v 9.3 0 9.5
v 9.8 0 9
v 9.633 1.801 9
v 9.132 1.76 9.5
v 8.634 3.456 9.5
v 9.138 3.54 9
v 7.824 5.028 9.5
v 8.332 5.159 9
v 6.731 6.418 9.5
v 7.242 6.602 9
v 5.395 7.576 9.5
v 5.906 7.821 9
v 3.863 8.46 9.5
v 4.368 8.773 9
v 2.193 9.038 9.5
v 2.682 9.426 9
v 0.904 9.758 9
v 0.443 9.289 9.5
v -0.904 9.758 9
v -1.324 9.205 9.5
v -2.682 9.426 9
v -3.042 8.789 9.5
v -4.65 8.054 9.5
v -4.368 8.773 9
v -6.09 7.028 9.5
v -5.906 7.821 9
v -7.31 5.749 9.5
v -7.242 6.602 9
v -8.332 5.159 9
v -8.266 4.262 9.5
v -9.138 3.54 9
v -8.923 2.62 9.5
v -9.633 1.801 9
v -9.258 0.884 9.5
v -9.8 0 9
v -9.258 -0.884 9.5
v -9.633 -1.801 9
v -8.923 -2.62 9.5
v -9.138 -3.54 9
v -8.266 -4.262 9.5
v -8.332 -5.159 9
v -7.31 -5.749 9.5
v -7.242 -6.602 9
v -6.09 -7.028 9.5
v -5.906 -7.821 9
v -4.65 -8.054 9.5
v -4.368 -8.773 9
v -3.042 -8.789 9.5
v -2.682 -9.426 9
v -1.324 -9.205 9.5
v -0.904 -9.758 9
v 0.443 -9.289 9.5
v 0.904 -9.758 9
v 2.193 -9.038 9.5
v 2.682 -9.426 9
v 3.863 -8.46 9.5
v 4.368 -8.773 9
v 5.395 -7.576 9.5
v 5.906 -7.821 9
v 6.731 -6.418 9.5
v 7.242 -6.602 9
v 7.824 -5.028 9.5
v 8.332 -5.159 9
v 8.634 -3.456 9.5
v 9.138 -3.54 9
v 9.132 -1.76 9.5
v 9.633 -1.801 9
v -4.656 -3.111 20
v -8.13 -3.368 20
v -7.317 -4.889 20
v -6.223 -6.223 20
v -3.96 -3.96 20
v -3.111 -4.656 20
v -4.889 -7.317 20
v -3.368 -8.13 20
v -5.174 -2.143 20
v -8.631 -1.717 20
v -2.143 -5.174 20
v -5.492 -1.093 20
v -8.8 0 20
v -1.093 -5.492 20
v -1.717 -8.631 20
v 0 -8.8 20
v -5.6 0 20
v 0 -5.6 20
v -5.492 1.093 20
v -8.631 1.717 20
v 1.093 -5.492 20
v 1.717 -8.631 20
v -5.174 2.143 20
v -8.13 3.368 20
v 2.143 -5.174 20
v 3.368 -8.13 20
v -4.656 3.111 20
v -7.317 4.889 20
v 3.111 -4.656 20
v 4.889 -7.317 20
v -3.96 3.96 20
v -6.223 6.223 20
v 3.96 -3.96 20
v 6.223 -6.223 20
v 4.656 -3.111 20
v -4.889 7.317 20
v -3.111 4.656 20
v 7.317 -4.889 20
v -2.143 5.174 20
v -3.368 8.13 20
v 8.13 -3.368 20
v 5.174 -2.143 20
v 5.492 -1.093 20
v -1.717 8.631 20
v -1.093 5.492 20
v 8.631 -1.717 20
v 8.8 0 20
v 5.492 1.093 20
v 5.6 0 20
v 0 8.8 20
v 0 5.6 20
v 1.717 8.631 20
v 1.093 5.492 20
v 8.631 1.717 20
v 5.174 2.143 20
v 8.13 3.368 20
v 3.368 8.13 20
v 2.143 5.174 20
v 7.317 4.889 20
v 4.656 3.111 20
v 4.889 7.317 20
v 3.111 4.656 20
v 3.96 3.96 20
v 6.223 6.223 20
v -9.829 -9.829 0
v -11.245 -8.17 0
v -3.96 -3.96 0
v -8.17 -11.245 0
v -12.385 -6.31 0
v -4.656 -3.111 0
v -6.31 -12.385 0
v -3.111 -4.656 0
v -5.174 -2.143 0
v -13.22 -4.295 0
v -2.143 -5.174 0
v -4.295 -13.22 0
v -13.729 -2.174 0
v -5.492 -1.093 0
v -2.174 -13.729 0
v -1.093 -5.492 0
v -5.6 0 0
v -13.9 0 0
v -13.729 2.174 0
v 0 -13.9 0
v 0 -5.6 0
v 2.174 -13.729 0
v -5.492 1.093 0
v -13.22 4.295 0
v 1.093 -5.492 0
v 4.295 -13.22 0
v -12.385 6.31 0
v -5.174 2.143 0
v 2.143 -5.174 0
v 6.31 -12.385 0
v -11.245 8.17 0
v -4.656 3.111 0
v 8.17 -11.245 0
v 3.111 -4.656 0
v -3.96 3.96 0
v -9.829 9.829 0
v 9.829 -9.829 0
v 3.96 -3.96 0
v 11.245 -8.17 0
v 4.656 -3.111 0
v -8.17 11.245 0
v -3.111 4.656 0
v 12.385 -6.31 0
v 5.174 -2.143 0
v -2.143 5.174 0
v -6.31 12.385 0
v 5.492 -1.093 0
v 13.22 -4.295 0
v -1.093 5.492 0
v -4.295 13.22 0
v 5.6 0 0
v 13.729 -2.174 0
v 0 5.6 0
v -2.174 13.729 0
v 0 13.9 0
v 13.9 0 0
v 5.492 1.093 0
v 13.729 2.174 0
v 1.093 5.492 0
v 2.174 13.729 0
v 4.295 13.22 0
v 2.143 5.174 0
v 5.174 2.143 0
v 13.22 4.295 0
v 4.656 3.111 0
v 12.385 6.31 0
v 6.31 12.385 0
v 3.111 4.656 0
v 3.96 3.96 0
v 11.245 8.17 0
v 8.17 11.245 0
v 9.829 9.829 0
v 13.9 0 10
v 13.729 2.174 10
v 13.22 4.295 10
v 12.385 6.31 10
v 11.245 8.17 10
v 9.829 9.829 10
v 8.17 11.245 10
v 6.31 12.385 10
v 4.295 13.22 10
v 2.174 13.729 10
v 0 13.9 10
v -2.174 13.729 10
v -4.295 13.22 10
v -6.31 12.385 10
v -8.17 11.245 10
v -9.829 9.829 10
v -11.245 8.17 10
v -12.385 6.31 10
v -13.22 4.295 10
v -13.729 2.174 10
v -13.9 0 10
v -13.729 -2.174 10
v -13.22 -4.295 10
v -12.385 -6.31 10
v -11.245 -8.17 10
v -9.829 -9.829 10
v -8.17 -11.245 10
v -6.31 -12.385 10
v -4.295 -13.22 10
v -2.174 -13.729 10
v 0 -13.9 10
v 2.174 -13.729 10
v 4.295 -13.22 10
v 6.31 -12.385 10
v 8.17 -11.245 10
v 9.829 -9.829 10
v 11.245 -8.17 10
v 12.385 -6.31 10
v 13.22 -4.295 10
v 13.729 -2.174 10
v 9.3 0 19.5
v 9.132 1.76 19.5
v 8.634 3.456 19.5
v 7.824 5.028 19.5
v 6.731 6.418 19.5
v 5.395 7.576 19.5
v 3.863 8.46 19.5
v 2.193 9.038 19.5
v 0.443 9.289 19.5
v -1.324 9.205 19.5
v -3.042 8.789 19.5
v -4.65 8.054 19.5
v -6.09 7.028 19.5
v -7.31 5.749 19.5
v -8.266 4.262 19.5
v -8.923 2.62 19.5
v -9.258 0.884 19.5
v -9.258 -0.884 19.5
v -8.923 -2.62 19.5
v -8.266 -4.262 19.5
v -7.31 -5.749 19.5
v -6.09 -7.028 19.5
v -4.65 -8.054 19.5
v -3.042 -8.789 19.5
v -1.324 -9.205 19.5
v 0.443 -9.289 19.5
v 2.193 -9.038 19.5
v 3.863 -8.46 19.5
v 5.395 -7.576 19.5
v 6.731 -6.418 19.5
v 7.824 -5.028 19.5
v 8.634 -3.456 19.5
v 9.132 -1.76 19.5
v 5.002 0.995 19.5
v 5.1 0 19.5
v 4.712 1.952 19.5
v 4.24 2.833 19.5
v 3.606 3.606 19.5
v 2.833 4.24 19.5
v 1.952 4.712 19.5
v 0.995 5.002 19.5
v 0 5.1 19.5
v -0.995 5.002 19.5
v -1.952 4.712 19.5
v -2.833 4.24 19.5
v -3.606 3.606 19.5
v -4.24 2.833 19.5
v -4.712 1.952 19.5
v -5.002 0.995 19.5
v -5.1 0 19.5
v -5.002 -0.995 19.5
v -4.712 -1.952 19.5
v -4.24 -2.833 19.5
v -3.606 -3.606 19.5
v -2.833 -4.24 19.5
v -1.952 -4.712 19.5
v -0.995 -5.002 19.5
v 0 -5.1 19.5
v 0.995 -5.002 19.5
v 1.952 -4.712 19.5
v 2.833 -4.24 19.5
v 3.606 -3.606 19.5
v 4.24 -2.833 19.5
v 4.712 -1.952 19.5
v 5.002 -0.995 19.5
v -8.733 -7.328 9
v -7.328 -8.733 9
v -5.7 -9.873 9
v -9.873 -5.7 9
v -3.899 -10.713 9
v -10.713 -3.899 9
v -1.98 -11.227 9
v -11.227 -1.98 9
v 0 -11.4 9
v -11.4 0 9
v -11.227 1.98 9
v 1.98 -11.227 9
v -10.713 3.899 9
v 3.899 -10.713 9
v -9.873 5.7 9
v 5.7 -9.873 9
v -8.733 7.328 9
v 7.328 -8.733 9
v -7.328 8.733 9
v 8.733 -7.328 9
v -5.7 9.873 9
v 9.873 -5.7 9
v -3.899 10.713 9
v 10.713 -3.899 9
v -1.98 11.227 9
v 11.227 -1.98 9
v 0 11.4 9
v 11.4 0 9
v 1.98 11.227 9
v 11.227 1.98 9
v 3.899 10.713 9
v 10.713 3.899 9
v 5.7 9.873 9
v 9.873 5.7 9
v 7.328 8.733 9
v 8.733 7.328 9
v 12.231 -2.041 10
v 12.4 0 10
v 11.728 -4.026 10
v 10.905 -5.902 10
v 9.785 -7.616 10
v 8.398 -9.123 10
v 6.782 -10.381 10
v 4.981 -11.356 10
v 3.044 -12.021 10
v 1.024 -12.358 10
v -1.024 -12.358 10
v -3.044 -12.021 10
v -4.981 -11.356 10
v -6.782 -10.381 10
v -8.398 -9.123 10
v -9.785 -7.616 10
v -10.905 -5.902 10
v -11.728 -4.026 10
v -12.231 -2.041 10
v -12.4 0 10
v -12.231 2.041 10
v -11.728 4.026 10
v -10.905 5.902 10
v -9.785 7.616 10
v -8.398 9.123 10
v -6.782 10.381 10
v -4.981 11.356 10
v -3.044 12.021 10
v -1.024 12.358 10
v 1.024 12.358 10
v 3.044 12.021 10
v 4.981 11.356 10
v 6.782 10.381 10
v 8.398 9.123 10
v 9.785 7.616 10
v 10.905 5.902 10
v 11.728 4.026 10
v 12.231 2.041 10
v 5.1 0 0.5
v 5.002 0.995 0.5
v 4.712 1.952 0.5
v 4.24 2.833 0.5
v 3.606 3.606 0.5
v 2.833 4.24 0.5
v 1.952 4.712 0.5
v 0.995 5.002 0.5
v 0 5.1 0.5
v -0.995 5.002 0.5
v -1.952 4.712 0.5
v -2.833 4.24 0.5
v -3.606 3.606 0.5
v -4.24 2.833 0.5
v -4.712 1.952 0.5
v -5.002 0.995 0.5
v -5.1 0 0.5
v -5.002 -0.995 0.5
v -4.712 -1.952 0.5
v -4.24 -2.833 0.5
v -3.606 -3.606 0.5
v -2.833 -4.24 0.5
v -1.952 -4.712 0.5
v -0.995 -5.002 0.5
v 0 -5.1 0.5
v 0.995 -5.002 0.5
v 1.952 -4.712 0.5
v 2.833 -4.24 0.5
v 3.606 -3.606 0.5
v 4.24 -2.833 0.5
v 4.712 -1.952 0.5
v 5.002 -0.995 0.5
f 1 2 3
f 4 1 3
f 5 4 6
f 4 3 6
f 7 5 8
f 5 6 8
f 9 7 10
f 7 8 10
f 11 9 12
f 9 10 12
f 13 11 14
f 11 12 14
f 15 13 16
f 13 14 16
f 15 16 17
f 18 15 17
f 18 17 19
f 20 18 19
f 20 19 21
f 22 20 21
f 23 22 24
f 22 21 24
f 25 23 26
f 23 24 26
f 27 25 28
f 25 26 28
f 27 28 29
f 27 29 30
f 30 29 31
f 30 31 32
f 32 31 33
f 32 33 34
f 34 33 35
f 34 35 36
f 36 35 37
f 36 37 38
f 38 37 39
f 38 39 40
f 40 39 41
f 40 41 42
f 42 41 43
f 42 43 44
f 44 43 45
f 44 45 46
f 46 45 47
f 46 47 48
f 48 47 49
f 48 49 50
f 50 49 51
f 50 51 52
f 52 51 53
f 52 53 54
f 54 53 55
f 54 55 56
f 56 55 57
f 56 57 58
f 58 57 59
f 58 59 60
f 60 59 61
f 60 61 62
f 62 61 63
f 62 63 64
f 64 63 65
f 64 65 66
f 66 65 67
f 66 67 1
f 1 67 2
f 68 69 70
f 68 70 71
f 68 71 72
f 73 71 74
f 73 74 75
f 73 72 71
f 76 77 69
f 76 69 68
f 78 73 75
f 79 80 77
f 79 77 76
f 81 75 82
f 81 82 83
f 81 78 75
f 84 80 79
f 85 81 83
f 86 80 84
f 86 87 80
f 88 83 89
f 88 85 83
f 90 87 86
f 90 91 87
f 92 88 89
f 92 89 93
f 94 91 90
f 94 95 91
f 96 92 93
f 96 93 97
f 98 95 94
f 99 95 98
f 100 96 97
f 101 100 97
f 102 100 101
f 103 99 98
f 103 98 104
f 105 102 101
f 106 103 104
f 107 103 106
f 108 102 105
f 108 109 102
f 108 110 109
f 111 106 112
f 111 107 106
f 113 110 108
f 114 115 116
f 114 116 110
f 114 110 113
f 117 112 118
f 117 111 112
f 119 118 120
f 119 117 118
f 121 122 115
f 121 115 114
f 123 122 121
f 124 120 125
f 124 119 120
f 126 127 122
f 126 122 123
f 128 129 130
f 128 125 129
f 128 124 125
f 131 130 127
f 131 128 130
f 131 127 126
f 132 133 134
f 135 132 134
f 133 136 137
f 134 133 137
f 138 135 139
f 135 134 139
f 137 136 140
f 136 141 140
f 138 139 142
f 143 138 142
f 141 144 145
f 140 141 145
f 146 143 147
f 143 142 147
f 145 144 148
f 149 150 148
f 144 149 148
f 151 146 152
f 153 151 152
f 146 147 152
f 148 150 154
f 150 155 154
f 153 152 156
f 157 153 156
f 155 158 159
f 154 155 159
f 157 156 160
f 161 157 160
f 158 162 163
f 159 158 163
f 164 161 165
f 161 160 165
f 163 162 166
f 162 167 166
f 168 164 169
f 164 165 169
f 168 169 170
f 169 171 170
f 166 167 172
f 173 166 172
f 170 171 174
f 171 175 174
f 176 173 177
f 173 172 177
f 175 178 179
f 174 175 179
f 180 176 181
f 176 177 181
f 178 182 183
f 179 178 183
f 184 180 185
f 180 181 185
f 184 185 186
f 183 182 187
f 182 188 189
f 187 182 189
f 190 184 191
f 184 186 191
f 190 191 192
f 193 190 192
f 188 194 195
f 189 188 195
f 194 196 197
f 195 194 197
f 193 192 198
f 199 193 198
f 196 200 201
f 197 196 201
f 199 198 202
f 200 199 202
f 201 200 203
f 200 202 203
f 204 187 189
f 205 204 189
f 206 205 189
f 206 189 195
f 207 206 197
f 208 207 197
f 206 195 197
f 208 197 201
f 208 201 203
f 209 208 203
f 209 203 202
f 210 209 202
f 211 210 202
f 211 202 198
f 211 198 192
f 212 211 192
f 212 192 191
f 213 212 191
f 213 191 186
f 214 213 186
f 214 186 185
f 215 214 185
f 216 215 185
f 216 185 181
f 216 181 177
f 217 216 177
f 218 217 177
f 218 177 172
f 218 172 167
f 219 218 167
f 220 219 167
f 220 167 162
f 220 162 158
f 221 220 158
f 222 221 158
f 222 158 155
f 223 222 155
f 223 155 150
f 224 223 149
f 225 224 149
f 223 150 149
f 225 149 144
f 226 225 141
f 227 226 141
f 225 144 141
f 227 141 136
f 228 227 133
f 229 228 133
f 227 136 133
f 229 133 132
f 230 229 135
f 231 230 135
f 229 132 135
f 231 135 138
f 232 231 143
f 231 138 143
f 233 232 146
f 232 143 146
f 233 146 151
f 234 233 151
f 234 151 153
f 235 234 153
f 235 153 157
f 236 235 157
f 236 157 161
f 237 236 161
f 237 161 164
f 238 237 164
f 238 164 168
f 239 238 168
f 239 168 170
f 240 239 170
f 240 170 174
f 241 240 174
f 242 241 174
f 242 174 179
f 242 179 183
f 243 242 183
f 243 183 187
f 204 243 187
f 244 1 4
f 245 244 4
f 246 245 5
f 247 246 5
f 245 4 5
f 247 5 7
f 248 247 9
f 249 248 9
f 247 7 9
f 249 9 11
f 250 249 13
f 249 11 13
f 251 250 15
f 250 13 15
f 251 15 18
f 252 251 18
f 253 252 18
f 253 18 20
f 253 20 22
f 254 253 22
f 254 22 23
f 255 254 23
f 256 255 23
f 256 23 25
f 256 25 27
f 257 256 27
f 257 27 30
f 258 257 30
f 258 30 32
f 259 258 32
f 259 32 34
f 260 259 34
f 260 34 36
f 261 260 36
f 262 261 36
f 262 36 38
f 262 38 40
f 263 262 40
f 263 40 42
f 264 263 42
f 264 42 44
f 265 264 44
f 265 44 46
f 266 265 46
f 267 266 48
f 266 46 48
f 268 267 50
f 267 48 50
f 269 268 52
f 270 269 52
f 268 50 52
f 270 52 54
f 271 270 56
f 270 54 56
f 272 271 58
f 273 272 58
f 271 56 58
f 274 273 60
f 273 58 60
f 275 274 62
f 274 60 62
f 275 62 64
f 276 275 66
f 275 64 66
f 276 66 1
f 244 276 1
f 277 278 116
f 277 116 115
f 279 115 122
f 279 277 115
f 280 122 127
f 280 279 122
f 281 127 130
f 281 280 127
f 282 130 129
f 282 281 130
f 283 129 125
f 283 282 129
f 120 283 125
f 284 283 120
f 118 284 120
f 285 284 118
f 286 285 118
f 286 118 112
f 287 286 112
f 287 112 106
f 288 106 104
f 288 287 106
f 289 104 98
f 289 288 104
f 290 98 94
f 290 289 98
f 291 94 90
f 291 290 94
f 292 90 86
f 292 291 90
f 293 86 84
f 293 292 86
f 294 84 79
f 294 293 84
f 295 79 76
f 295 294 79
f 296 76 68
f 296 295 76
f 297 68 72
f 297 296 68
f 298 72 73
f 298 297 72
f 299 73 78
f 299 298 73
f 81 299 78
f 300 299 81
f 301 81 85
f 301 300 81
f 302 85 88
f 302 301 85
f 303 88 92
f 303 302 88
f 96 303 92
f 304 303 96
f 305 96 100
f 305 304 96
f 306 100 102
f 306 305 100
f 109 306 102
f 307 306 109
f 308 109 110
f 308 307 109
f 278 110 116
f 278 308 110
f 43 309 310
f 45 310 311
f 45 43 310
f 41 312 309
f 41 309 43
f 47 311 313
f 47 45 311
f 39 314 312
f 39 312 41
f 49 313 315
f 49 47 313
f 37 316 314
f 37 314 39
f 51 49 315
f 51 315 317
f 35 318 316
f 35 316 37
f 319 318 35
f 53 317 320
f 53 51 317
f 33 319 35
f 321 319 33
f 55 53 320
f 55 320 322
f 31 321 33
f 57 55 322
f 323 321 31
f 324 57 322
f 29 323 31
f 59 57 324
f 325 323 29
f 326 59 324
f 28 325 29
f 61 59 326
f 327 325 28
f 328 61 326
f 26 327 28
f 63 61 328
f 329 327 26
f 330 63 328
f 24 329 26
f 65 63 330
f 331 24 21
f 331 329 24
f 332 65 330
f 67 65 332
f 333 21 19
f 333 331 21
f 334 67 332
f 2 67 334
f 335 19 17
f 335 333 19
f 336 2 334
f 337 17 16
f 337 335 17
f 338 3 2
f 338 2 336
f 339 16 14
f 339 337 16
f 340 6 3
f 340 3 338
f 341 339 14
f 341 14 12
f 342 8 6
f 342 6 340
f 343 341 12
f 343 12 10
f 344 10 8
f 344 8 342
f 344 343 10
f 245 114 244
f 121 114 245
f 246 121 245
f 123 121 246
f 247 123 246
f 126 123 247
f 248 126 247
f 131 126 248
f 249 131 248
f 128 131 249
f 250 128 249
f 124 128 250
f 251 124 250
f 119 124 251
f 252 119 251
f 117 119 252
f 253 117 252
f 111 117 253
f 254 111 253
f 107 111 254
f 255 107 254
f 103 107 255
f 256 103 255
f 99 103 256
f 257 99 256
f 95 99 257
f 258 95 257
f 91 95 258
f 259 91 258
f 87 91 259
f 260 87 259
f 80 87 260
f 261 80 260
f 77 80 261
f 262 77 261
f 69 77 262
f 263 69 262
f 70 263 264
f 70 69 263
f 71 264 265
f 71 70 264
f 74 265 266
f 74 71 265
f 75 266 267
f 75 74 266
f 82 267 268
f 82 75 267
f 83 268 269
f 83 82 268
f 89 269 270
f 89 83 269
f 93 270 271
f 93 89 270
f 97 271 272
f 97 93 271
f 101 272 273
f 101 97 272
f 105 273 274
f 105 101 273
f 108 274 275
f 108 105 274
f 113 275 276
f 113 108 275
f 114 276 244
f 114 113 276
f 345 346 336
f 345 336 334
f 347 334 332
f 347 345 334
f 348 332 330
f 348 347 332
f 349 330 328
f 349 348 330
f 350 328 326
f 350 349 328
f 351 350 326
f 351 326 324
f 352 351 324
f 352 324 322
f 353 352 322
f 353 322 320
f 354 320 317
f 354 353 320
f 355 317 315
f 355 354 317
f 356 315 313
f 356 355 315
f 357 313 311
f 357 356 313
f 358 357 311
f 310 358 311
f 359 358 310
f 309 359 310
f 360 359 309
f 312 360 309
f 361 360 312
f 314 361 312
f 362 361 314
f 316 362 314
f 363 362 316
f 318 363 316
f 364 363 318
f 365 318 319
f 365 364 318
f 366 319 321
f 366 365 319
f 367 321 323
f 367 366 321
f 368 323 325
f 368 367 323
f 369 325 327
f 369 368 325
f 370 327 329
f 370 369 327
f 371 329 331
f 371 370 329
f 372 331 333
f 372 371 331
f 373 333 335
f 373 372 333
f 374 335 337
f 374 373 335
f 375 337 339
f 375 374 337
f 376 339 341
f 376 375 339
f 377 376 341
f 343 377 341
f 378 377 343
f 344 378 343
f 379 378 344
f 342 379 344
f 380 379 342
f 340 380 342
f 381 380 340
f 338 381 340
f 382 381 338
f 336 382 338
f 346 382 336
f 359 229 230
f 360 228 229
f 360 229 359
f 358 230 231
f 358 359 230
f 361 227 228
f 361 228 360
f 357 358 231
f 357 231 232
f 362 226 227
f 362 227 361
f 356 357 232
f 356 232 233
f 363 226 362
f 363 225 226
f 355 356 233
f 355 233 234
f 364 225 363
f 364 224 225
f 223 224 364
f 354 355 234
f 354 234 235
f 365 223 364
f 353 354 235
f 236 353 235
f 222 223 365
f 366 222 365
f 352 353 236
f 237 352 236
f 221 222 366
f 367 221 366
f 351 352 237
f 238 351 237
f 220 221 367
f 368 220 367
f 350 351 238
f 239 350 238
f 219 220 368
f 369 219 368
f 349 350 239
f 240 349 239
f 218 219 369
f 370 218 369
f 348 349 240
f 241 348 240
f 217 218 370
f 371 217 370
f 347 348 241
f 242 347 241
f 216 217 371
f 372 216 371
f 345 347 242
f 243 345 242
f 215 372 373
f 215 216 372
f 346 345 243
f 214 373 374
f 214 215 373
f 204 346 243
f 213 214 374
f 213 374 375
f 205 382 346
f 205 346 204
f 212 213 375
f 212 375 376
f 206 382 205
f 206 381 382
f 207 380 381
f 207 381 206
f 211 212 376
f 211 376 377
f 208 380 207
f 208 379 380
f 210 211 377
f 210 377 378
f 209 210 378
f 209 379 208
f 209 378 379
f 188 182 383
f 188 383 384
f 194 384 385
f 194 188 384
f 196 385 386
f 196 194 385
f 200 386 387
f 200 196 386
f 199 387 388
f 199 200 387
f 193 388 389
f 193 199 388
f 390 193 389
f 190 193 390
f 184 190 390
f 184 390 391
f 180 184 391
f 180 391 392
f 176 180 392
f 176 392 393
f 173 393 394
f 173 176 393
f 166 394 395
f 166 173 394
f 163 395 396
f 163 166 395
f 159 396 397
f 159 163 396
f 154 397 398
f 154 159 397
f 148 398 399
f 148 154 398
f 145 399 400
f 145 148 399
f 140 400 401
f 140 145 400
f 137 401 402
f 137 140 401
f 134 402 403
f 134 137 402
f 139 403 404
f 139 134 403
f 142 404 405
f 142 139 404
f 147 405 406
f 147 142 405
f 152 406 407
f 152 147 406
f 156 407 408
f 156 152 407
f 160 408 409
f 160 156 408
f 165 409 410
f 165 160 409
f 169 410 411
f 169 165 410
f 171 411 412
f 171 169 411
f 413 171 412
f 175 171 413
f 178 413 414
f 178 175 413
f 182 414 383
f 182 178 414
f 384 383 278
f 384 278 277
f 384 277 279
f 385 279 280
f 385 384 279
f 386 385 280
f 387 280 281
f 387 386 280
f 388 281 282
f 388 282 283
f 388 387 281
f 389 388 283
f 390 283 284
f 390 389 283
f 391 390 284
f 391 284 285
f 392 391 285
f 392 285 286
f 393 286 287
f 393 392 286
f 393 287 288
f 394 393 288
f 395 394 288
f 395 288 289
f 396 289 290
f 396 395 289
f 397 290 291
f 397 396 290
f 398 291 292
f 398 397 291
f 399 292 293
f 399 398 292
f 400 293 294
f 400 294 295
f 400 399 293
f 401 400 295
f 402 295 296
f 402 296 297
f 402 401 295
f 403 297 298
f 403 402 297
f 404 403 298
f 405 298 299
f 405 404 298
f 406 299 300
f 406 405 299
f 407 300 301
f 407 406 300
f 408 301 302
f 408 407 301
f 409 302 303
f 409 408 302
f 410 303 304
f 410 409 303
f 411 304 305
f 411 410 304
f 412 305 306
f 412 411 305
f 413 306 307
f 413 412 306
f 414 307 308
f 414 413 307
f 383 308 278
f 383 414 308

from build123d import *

# Parameters (mm, degrees)
F0_R     = 13.9
F0_R_2   = 12.4
F1_DEPTH = 10
F0_R_3   = 9.3
F2_DEPTH = 9
F0_R_4   = 5.1
F3_DEPTH = 20
F4_SIZE  = 0.5
F5_SIZE  = 0.99999


# Not quite as in the source:
# - a fillet or chamfer is up to 0.001 mm smaller than in the source, because OpenCascade refuses the exact size


with BuildPart() as f1:
    # F0 (on Top) → F1 (new body)
    with BuildSketch(Plane.XY):
        Circle(F0_R)
        Circle(F0_R_2, mode=Mode.SUBTRACT)
    extrude(amount=F1_DEPTH)

    # F0 (on Top) → F2 (join)
    with BuildSketch(Plane.XY):
        Circle(F0_R)
        Circle(F0_R_2, mode=Mode.SUBTRACT)
        Circle(F0_R_2)
        Circle(F0_R_3, mode=Mode.SUBTRACT)
    extrude(amount=F2_DEPTH)

    # F0 (on Top) → F3 (join)
    with BuildSketch(Plane.XY):
        Circle(F0_R_3)
        Circle(F0_R_4, mode=Mode.SUBTRACT)
    extrude(amount=F3_DEPTH)

    # F4
    f4_edges = [f1.edges().sort_by_distance(p)[0] for p in [
        (-5.1, 0, 20),
        (-9.3, 0, 20),
        (-9.3, 0, 9),
        (-5.1, 0, 0),
    ]]
    chamfer(f4_edges, length=F4_SIZE)

    # F5 (size 1 in the source; OpenCascade refuses exactly that, so slightly less here)
    f5_edges = [f1.edges().sort_by_distance(p)[0] for p in [
        (-12.4, 0, 9),
    ]]
    chamfer(f5_edges, length=F5_SIZE)


solid = f1.part
